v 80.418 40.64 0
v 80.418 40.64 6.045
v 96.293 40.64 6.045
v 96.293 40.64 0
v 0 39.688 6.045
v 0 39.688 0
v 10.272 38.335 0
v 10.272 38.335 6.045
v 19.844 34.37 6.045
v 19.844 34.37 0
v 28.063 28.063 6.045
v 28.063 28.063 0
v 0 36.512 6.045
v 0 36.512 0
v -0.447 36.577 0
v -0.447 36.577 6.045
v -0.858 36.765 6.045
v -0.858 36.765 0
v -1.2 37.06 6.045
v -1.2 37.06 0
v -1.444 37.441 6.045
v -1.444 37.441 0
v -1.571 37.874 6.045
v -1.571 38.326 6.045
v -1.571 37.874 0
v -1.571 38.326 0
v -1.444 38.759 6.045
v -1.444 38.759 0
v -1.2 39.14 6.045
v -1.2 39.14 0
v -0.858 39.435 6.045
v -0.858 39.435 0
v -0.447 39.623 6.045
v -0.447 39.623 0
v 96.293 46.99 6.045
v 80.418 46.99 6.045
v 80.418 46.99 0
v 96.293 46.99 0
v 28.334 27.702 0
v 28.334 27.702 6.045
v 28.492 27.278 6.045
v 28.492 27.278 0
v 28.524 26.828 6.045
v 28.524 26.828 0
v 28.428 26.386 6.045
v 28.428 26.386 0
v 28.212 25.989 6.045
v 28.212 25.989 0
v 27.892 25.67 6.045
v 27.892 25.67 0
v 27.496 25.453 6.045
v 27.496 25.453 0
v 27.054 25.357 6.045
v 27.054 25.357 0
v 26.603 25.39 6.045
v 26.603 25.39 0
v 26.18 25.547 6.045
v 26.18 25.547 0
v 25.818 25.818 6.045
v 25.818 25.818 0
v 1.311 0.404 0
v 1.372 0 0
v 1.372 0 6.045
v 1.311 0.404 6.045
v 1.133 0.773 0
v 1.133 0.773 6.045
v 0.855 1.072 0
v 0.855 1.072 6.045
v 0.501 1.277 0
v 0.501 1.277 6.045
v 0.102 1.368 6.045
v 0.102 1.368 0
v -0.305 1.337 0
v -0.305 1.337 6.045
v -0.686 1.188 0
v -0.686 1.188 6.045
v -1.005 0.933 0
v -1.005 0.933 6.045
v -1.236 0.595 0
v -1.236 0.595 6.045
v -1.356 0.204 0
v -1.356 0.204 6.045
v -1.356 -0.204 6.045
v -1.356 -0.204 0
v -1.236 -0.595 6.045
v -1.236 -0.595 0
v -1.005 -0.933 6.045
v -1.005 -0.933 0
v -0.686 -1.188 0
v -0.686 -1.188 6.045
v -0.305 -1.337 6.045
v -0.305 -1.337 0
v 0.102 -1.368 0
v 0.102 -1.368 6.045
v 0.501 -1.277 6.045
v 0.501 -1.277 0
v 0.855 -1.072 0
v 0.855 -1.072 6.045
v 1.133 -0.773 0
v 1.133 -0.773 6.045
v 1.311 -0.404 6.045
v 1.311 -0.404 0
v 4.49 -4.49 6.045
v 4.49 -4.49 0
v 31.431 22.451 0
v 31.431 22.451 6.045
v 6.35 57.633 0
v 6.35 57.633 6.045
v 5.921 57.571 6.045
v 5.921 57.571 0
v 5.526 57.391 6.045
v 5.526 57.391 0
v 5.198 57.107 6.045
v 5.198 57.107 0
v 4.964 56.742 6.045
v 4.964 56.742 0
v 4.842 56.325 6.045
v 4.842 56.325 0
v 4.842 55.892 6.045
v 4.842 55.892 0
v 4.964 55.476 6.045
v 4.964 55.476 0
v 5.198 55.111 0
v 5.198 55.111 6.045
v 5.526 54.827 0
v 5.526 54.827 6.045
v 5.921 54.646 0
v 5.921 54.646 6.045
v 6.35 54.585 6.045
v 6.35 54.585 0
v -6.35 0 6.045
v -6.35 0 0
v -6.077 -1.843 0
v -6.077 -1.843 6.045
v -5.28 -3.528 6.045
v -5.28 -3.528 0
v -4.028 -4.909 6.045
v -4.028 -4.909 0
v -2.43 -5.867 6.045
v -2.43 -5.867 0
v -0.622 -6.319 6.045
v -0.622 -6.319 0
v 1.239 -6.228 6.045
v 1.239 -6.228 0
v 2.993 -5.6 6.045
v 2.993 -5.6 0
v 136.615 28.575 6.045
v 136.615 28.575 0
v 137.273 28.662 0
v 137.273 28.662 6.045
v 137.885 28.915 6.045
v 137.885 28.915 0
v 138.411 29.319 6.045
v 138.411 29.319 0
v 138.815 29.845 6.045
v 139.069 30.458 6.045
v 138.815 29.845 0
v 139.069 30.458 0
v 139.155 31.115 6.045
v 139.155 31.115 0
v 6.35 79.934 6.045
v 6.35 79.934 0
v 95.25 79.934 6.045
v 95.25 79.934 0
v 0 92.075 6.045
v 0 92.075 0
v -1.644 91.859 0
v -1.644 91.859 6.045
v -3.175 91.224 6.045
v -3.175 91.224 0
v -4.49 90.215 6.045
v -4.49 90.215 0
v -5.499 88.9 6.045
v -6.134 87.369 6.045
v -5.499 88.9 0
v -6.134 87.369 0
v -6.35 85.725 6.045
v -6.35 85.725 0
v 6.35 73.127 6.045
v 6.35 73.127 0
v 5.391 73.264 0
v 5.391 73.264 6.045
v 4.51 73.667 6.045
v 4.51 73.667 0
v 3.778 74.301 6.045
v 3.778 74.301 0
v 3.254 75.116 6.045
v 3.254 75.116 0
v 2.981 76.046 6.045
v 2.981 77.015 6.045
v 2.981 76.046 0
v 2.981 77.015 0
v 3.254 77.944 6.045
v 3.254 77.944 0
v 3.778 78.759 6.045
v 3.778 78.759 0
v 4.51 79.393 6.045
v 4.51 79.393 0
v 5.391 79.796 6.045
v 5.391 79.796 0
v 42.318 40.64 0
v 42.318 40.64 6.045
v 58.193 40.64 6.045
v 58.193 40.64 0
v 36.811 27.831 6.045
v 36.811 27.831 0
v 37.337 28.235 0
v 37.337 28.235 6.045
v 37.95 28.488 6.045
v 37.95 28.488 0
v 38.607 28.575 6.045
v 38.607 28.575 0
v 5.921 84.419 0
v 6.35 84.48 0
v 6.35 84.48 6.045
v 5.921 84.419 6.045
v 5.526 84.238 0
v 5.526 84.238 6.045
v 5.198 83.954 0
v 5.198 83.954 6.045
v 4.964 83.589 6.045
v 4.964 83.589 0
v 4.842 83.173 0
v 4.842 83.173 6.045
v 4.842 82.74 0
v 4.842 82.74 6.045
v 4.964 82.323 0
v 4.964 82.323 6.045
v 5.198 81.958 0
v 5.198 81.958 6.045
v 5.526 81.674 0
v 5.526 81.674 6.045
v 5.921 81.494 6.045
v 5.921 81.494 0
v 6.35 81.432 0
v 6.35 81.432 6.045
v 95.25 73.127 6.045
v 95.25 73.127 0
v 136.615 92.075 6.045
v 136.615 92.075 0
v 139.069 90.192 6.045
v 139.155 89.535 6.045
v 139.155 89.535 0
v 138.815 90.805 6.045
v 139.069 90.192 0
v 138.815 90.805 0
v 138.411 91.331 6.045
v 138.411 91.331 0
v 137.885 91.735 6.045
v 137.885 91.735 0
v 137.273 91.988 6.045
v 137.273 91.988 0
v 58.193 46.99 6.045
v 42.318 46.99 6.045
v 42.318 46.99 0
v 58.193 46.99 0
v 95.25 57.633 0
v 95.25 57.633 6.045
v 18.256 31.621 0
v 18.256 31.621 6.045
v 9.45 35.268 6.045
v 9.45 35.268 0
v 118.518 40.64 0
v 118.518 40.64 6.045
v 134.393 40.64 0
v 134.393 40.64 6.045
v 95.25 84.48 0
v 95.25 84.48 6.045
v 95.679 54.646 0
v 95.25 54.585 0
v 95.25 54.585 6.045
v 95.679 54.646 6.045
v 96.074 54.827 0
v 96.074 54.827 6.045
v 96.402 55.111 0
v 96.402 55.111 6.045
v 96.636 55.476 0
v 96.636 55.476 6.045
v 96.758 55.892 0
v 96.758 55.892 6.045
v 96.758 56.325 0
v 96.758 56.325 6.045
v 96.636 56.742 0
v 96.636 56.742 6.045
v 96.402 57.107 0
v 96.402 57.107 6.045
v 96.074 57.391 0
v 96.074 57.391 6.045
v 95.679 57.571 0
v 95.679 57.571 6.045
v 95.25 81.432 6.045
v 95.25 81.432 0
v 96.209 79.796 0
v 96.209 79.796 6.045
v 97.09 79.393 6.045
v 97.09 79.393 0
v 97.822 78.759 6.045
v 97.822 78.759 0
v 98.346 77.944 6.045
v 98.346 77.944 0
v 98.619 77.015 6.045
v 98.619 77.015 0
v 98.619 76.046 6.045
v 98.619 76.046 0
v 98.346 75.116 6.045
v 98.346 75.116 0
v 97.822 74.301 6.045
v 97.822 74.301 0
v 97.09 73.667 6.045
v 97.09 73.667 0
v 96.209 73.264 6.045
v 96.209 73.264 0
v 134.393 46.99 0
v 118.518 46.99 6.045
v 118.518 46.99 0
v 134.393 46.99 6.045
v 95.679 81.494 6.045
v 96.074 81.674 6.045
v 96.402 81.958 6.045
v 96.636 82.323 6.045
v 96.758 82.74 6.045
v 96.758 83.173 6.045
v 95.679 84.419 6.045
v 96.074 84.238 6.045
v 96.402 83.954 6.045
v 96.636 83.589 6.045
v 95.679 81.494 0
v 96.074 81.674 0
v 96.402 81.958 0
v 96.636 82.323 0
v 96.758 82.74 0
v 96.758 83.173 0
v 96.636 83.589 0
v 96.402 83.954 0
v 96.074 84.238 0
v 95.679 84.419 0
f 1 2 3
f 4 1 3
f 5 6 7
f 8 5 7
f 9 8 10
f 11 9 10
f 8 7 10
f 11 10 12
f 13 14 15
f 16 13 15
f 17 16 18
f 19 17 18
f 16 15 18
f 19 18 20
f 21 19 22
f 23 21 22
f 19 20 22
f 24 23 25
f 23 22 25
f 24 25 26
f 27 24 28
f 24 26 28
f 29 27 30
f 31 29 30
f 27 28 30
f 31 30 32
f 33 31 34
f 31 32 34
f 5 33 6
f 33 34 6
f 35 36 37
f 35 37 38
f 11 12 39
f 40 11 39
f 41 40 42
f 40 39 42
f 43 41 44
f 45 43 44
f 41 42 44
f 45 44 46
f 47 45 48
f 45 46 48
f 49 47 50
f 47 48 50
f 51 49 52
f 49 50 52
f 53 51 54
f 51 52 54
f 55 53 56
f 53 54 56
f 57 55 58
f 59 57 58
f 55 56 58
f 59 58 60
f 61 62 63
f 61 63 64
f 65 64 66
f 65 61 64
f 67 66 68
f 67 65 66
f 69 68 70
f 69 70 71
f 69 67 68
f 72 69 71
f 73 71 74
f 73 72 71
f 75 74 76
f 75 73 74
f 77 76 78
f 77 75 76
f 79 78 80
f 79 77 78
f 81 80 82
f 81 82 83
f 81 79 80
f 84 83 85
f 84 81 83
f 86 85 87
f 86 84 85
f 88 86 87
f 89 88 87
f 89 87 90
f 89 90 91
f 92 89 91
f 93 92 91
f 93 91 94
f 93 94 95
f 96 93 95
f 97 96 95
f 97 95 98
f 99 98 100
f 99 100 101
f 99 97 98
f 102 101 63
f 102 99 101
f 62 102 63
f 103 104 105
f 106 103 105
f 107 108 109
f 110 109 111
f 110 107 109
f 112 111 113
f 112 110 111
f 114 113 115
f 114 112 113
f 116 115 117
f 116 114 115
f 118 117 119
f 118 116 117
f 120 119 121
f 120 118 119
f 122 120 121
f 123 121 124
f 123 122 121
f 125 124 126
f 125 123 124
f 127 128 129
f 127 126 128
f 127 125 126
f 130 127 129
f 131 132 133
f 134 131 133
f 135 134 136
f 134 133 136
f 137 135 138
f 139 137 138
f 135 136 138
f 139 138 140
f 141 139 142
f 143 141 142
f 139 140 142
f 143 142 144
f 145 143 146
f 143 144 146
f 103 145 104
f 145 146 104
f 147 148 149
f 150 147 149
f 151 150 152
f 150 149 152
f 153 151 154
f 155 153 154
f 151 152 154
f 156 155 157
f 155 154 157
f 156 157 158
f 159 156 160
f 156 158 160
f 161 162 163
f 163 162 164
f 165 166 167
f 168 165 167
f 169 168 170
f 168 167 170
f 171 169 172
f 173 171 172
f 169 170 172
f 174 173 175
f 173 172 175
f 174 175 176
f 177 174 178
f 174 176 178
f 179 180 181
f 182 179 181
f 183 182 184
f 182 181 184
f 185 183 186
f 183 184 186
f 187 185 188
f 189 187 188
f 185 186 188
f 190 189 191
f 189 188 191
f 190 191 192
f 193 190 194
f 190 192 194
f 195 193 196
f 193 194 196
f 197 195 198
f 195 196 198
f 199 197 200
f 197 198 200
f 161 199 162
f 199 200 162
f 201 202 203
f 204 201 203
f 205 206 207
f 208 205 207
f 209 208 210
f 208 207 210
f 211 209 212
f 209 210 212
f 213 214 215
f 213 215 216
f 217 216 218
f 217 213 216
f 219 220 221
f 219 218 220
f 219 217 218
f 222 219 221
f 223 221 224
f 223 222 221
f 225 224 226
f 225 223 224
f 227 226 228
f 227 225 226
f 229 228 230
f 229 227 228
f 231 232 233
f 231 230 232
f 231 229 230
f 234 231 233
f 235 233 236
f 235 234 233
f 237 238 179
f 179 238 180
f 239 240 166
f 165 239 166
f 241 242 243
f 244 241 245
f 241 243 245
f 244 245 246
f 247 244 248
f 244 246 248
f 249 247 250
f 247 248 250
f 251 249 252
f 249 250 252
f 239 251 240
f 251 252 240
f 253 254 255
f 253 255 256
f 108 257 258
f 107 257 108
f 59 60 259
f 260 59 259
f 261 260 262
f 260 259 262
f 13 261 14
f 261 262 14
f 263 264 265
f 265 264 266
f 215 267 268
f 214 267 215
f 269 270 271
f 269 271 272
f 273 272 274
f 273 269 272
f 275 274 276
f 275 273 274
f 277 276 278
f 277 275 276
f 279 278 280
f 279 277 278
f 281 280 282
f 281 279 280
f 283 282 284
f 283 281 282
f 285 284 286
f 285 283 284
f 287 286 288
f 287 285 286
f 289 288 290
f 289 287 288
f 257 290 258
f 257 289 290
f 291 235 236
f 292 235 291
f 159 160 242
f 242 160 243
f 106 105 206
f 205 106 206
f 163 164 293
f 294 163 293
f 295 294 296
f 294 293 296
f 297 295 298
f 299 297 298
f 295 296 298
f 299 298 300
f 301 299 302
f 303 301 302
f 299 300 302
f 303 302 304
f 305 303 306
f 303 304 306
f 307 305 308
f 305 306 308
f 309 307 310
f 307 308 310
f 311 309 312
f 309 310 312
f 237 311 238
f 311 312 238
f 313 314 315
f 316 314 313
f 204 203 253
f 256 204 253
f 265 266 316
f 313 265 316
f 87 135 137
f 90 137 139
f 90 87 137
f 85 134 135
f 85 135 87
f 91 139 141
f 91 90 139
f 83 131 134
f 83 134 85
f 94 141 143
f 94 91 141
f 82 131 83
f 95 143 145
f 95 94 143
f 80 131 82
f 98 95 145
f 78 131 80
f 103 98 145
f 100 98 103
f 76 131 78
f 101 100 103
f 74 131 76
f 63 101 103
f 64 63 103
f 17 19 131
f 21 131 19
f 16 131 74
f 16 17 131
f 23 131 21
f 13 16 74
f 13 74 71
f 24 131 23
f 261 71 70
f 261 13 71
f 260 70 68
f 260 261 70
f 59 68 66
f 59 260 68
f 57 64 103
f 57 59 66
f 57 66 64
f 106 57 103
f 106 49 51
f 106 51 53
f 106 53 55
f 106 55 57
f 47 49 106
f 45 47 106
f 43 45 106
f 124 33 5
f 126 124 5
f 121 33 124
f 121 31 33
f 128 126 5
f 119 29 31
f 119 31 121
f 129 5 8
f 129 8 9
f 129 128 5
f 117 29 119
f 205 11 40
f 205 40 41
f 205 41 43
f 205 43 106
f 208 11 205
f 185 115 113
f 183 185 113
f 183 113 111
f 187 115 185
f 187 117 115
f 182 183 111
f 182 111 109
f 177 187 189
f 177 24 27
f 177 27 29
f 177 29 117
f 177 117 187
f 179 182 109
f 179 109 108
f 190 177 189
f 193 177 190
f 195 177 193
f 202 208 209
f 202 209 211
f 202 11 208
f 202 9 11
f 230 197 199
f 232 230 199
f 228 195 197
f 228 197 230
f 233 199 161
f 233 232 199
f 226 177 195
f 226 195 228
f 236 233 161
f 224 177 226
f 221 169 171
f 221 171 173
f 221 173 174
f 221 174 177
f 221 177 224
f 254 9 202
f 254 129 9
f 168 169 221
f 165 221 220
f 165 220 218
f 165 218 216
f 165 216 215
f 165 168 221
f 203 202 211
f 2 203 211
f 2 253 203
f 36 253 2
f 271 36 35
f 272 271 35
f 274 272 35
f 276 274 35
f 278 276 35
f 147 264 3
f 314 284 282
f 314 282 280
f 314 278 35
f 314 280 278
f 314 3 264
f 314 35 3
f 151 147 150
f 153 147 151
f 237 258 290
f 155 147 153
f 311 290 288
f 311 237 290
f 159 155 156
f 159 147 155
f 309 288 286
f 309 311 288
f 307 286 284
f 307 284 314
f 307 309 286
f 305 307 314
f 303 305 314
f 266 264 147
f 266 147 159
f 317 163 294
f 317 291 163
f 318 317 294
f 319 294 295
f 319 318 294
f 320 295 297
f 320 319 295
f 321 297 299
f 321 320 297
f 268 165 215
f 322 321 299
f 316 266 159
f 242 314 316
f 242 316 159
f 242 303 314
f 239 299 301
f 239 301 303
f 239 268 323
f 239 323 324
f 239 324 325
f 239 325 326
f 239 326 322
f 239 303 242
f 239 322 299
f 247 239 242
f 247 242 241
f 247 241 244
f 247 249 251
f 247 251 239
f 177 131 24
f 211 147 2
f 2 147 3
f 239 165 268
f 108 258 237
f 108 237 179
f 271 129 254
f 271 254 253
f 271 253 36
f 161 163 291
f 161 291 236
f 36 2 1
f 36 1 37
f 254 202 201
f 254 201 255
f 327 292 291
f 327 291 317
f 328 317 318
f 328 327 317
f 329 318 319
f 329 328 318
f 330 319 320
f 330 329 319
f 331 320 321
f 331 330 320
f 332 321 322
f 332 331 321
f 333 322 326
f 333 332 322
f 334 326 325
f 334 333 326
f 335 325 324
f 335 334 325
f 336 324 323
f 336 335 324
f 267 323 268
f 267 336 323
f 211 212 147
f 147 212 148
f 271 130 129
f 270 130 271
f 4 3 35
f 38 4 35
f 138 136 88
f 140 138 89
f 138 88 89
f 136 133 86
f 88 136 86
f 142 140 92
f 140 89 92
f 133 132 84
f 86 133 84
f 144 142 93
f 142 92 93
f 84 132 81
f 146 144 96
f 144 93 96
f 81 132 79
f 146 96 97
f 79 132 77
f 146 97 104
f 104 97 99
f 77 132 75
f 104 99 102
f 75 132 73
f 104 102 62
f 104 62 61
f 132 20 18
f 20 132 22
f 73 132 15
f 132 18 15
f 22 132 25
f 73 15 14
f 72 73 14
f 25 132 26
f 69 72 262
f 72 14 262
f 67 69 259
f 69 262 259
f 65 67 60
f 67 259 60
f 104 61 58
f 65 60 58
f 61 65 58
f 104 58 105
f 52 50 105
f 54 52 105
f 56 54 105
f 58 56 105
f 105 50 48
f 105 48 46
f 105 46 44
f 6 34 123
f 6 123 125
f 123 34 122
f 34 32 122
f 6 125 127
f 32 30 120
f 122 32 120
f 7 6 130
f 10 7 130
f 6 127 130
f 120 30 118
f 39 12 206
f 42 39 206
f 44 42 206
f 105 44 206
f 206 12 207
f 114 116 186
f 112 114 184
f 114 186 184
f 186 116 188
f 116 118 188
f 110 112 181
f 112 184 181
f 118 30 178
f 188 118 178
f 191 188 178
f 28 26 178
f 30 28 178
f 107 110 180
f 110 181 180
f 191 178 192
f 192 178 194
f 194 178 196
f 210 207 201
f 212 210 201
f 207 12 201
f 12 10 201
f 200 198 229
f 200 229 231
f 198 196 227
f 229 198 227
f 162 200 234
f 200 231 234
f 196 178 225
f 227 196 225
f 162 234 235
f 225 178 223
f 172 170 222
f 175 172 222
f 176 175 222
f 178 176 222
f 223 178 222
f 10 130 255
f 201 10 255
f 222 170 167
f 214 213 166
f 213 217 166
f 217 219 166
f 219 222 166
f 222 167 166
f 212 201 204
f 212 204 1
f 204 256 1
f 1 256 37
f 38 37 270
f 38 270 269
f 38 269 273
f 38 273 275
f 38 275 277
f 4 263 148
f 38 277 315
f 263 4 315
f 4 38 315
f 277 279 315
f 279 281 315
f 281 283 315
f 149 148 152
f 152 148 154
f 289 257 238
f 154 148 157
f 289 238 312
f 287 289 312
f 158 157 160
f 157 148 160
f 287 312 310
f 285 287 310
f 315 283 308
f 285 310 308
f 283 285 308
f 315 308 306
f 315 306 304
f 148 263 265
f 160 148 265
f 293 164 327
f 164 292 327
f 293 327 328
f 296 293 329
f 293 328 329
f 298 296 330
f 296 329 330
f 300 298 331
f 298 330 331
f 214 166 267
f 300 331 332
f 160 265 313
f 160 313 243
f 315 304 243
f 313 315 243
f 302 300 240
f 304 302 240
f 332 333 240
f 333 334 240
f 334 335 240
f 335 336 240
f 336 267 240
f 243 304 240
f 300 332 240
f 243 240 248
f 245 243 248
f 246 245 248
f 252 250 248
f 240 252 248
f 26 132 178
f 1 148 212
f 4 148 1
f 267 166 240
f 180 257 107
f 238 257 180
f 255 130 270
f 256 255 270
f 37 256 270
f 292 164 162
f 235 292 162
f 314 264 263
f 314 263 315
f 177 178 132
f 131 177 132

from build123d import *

# Parameters (mm, degrees)
SKETCH1_R           = 1.3716
BOSS_EXTRUDE1_DEPTH = 6.0452
SKETCH2_W           = 15.875
SKETCH2_H           = 6.35
CUT_EXTRUDE1_DEPTH  = 6.0452
CUT_EXTRUDE2_DEPTH  = 7.62


with BuildPart() as part:
    # Sketch1 → Boss-Extrude1 (new body)
    with BuildSketch(Plane.XY):
        with BuildLine():
            Line((-6.35, 85.725), (-6.35, 0))
            ThreePointArc((-6.35, 0), (-2.430039796, -5.866635031), (4.490128061, -4.490128061))
            Line((4.490128061, -4.490128061), (31.430896424, 22.450640303))
            Line((31.430896424, 22.450640303), (36.811307345, 27.831051224))
            ThreePointArc((36.811307345, 27.831051224), (37.635342651, 28.381654013), (38.607358569, 28.575))
            Line((38.607358569, 28.575), (136.615256121, 28.575))
            ThreePointArc((136.615256121, 28.575), (138.411307345, 29.318948776), (139.155256121, 31.115))
            Line((139.155256121, 31.115), (139.155256121, 89.535))
            ThreePointArc((139.155256121, 89.535), (138.411307345, 91.331051224), (136.615256121, 92.075))
            Line((136.615256121, 92.075), (0, 92.075))
            ThreePointArc((0, 92.075), (-4.490128061, 90.215128061), (-6.35, 85.725))
        make_face()
        Circle(SKETCH1_R, mode=Mode.SUBTRACT)
        with BuildLine():
            ThreePointArc((25.818236348, 25.818236348), (13.972728824, 33.733151431), (0, 36.5125))
            ThreePointArc((0, 36.5125), (-1.5875, 38.1), (0, 39.6875))
            ThreePointArc((0, 39.6875), (15.187748722, 36.666468947), (28.063300378, 28.063300378))
            ThreePointArc((28.063300378, 28.063300378), (28.063300378, 25.818236348), (25.818236348, 25.818236348))
        make_face(mode=Mode.SUBTRACT)
    extrude(amount=BOSS_EXTRUDE1_DEPTH)

    # Sketch2 → Cut-Extrude1 (cut)
    with BuildSketch(Plane.XY.offset(6.0452)):
        with Locations((126.455256121, 43.815)):
            Rectangle(SKETCH2_W, SKETCH2_H)
        with Locations((88.355256121, 43.815)):
            Rectangle(SKETCH2_W, SKETCH2_H)
        with Locations((50.255256121, 43.815)):
            Rectangle(SKETCH2_W, SKETCH2_H)
    extrude(amount=-CUT_EXTRUDE1_DEPTH, mode=Mode.SUBTRACT)

    # Sketch3 → Cut-Extrude2 (cut)
    with BuildSketch(Plane(origin=(0, 0, 0), x_dir=(-1, 0, 0), z_dir=(0, 0, -1))):
        with BuildLine():
            Line((-95.25, 84.4804), (-6.35, 84.4804))
            ThreePointArc((-6.35, 84.4804), (-4.826, 82.9564), (-6.35, 81.4324))
            Line((-6.35, 81.4324), (-95.25, 81.4324))
            ThreePointArc((-95.25, 81.4324), (-96.774, 82.9564), (-95.25, 84.4804))
        make_face()
        with BuildLine():
            Line((-95.25, 57.6326), (-6.35, 57.6326))
            ThreePointArc((-6.35, 57.6326), (-4.826, 56.1086), (-6.35, 54.5846))
            Line((-6.35, 54.5846), (-95.25, 54.5846))
            ThreePointArc((-95.25, 54.5846), (-96.774, 56.1086), (-95.25, 57.6326))
        make_face()
        with BuildLine():
            Line((-95.25, 73.1266), (-6.35, 73.1266))
            ThreePointArc((-6.35, 73.1266), (-2.9464, 76.5302), (-6.35, 79.9338))
            Line((-6.35, 79.9338), (-95.25, 79.9338))
            ThreePointArc((-95.25, 79.9338), (-98.6536, 76.5302), (-95.25, 73.1266))
        make_face()
    extrude(amount=-CUT_EXTRUDE2_DEPTH, mode=Mode.SUBTRACT)


solid = part.part
